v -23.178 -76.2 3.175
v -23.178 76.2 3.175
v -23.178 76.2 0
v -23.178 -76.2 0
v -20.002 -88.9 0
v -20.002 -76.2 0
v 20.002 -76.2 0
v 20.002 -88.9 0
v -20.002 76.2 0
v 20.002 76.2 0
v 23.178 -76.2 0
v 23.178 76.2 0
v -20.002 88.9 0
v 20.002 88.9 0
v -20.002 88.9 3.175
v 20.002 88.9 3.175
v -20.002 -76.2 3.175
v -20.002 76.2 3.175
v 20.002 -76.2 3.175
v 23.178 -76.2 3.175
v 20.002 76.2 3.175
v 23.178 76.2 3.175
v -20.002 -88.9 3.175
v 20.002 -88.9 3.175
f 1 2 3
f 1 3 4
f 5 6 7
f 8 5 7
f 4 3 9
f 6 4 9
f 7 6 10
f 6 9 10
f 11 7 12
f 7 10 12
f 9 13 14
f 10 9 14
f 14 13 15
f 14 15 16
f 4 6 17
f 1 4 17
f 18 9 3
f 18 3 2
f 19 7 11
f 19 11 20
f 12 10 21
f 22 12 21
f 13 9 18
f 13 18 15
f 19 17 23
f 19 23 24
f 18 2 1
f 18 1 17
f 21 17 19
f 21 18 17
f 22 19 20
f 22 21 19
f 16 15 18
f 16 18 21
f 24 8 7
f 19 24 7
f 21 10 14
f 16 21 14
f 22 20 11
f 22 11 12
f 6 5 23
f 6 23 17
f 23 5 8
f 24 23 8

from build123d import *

# Parameters (mm, degrees)
F0_W     = 40.005
F0_H     = 177.8
F1_DEPTH = 3.175
F2_W     = 152.4
F2_H     = 3.175
F3_DEPTH = 3.175
F4_W     = 152.4
F4_H     = 3.175
F5_DEPTH = 3.175


with BuildPart() as f1:
    # F0 (on Top) → F1 (new body)
    with BuildSketch(Plane.XY):
        Rectangle(F0_W, F0_H)
    extrude(amount=F1_DEPTH)

    # F2 (on face) → F3 (join)
    with BuildSketch(Plane(origin=(-20.0025, 0, 0), x_dir=(0, -1, 0), z_dir=(-1, 0, 0))):
        with Locations((0, 1.5875)):
            Rectangle(F2_W, F2_H)
    extrude(amount=F3_DEPTH)

    # F4 (on face) → F5 (join)
    with BuildSketch(Plane.YZ.offset(20.0025)):
        with Locations((0, 1.5875)):
            Rectangle(F4_W, F4_H)
    extrude(amount=F5_DEPTH)


solid = f1.part
